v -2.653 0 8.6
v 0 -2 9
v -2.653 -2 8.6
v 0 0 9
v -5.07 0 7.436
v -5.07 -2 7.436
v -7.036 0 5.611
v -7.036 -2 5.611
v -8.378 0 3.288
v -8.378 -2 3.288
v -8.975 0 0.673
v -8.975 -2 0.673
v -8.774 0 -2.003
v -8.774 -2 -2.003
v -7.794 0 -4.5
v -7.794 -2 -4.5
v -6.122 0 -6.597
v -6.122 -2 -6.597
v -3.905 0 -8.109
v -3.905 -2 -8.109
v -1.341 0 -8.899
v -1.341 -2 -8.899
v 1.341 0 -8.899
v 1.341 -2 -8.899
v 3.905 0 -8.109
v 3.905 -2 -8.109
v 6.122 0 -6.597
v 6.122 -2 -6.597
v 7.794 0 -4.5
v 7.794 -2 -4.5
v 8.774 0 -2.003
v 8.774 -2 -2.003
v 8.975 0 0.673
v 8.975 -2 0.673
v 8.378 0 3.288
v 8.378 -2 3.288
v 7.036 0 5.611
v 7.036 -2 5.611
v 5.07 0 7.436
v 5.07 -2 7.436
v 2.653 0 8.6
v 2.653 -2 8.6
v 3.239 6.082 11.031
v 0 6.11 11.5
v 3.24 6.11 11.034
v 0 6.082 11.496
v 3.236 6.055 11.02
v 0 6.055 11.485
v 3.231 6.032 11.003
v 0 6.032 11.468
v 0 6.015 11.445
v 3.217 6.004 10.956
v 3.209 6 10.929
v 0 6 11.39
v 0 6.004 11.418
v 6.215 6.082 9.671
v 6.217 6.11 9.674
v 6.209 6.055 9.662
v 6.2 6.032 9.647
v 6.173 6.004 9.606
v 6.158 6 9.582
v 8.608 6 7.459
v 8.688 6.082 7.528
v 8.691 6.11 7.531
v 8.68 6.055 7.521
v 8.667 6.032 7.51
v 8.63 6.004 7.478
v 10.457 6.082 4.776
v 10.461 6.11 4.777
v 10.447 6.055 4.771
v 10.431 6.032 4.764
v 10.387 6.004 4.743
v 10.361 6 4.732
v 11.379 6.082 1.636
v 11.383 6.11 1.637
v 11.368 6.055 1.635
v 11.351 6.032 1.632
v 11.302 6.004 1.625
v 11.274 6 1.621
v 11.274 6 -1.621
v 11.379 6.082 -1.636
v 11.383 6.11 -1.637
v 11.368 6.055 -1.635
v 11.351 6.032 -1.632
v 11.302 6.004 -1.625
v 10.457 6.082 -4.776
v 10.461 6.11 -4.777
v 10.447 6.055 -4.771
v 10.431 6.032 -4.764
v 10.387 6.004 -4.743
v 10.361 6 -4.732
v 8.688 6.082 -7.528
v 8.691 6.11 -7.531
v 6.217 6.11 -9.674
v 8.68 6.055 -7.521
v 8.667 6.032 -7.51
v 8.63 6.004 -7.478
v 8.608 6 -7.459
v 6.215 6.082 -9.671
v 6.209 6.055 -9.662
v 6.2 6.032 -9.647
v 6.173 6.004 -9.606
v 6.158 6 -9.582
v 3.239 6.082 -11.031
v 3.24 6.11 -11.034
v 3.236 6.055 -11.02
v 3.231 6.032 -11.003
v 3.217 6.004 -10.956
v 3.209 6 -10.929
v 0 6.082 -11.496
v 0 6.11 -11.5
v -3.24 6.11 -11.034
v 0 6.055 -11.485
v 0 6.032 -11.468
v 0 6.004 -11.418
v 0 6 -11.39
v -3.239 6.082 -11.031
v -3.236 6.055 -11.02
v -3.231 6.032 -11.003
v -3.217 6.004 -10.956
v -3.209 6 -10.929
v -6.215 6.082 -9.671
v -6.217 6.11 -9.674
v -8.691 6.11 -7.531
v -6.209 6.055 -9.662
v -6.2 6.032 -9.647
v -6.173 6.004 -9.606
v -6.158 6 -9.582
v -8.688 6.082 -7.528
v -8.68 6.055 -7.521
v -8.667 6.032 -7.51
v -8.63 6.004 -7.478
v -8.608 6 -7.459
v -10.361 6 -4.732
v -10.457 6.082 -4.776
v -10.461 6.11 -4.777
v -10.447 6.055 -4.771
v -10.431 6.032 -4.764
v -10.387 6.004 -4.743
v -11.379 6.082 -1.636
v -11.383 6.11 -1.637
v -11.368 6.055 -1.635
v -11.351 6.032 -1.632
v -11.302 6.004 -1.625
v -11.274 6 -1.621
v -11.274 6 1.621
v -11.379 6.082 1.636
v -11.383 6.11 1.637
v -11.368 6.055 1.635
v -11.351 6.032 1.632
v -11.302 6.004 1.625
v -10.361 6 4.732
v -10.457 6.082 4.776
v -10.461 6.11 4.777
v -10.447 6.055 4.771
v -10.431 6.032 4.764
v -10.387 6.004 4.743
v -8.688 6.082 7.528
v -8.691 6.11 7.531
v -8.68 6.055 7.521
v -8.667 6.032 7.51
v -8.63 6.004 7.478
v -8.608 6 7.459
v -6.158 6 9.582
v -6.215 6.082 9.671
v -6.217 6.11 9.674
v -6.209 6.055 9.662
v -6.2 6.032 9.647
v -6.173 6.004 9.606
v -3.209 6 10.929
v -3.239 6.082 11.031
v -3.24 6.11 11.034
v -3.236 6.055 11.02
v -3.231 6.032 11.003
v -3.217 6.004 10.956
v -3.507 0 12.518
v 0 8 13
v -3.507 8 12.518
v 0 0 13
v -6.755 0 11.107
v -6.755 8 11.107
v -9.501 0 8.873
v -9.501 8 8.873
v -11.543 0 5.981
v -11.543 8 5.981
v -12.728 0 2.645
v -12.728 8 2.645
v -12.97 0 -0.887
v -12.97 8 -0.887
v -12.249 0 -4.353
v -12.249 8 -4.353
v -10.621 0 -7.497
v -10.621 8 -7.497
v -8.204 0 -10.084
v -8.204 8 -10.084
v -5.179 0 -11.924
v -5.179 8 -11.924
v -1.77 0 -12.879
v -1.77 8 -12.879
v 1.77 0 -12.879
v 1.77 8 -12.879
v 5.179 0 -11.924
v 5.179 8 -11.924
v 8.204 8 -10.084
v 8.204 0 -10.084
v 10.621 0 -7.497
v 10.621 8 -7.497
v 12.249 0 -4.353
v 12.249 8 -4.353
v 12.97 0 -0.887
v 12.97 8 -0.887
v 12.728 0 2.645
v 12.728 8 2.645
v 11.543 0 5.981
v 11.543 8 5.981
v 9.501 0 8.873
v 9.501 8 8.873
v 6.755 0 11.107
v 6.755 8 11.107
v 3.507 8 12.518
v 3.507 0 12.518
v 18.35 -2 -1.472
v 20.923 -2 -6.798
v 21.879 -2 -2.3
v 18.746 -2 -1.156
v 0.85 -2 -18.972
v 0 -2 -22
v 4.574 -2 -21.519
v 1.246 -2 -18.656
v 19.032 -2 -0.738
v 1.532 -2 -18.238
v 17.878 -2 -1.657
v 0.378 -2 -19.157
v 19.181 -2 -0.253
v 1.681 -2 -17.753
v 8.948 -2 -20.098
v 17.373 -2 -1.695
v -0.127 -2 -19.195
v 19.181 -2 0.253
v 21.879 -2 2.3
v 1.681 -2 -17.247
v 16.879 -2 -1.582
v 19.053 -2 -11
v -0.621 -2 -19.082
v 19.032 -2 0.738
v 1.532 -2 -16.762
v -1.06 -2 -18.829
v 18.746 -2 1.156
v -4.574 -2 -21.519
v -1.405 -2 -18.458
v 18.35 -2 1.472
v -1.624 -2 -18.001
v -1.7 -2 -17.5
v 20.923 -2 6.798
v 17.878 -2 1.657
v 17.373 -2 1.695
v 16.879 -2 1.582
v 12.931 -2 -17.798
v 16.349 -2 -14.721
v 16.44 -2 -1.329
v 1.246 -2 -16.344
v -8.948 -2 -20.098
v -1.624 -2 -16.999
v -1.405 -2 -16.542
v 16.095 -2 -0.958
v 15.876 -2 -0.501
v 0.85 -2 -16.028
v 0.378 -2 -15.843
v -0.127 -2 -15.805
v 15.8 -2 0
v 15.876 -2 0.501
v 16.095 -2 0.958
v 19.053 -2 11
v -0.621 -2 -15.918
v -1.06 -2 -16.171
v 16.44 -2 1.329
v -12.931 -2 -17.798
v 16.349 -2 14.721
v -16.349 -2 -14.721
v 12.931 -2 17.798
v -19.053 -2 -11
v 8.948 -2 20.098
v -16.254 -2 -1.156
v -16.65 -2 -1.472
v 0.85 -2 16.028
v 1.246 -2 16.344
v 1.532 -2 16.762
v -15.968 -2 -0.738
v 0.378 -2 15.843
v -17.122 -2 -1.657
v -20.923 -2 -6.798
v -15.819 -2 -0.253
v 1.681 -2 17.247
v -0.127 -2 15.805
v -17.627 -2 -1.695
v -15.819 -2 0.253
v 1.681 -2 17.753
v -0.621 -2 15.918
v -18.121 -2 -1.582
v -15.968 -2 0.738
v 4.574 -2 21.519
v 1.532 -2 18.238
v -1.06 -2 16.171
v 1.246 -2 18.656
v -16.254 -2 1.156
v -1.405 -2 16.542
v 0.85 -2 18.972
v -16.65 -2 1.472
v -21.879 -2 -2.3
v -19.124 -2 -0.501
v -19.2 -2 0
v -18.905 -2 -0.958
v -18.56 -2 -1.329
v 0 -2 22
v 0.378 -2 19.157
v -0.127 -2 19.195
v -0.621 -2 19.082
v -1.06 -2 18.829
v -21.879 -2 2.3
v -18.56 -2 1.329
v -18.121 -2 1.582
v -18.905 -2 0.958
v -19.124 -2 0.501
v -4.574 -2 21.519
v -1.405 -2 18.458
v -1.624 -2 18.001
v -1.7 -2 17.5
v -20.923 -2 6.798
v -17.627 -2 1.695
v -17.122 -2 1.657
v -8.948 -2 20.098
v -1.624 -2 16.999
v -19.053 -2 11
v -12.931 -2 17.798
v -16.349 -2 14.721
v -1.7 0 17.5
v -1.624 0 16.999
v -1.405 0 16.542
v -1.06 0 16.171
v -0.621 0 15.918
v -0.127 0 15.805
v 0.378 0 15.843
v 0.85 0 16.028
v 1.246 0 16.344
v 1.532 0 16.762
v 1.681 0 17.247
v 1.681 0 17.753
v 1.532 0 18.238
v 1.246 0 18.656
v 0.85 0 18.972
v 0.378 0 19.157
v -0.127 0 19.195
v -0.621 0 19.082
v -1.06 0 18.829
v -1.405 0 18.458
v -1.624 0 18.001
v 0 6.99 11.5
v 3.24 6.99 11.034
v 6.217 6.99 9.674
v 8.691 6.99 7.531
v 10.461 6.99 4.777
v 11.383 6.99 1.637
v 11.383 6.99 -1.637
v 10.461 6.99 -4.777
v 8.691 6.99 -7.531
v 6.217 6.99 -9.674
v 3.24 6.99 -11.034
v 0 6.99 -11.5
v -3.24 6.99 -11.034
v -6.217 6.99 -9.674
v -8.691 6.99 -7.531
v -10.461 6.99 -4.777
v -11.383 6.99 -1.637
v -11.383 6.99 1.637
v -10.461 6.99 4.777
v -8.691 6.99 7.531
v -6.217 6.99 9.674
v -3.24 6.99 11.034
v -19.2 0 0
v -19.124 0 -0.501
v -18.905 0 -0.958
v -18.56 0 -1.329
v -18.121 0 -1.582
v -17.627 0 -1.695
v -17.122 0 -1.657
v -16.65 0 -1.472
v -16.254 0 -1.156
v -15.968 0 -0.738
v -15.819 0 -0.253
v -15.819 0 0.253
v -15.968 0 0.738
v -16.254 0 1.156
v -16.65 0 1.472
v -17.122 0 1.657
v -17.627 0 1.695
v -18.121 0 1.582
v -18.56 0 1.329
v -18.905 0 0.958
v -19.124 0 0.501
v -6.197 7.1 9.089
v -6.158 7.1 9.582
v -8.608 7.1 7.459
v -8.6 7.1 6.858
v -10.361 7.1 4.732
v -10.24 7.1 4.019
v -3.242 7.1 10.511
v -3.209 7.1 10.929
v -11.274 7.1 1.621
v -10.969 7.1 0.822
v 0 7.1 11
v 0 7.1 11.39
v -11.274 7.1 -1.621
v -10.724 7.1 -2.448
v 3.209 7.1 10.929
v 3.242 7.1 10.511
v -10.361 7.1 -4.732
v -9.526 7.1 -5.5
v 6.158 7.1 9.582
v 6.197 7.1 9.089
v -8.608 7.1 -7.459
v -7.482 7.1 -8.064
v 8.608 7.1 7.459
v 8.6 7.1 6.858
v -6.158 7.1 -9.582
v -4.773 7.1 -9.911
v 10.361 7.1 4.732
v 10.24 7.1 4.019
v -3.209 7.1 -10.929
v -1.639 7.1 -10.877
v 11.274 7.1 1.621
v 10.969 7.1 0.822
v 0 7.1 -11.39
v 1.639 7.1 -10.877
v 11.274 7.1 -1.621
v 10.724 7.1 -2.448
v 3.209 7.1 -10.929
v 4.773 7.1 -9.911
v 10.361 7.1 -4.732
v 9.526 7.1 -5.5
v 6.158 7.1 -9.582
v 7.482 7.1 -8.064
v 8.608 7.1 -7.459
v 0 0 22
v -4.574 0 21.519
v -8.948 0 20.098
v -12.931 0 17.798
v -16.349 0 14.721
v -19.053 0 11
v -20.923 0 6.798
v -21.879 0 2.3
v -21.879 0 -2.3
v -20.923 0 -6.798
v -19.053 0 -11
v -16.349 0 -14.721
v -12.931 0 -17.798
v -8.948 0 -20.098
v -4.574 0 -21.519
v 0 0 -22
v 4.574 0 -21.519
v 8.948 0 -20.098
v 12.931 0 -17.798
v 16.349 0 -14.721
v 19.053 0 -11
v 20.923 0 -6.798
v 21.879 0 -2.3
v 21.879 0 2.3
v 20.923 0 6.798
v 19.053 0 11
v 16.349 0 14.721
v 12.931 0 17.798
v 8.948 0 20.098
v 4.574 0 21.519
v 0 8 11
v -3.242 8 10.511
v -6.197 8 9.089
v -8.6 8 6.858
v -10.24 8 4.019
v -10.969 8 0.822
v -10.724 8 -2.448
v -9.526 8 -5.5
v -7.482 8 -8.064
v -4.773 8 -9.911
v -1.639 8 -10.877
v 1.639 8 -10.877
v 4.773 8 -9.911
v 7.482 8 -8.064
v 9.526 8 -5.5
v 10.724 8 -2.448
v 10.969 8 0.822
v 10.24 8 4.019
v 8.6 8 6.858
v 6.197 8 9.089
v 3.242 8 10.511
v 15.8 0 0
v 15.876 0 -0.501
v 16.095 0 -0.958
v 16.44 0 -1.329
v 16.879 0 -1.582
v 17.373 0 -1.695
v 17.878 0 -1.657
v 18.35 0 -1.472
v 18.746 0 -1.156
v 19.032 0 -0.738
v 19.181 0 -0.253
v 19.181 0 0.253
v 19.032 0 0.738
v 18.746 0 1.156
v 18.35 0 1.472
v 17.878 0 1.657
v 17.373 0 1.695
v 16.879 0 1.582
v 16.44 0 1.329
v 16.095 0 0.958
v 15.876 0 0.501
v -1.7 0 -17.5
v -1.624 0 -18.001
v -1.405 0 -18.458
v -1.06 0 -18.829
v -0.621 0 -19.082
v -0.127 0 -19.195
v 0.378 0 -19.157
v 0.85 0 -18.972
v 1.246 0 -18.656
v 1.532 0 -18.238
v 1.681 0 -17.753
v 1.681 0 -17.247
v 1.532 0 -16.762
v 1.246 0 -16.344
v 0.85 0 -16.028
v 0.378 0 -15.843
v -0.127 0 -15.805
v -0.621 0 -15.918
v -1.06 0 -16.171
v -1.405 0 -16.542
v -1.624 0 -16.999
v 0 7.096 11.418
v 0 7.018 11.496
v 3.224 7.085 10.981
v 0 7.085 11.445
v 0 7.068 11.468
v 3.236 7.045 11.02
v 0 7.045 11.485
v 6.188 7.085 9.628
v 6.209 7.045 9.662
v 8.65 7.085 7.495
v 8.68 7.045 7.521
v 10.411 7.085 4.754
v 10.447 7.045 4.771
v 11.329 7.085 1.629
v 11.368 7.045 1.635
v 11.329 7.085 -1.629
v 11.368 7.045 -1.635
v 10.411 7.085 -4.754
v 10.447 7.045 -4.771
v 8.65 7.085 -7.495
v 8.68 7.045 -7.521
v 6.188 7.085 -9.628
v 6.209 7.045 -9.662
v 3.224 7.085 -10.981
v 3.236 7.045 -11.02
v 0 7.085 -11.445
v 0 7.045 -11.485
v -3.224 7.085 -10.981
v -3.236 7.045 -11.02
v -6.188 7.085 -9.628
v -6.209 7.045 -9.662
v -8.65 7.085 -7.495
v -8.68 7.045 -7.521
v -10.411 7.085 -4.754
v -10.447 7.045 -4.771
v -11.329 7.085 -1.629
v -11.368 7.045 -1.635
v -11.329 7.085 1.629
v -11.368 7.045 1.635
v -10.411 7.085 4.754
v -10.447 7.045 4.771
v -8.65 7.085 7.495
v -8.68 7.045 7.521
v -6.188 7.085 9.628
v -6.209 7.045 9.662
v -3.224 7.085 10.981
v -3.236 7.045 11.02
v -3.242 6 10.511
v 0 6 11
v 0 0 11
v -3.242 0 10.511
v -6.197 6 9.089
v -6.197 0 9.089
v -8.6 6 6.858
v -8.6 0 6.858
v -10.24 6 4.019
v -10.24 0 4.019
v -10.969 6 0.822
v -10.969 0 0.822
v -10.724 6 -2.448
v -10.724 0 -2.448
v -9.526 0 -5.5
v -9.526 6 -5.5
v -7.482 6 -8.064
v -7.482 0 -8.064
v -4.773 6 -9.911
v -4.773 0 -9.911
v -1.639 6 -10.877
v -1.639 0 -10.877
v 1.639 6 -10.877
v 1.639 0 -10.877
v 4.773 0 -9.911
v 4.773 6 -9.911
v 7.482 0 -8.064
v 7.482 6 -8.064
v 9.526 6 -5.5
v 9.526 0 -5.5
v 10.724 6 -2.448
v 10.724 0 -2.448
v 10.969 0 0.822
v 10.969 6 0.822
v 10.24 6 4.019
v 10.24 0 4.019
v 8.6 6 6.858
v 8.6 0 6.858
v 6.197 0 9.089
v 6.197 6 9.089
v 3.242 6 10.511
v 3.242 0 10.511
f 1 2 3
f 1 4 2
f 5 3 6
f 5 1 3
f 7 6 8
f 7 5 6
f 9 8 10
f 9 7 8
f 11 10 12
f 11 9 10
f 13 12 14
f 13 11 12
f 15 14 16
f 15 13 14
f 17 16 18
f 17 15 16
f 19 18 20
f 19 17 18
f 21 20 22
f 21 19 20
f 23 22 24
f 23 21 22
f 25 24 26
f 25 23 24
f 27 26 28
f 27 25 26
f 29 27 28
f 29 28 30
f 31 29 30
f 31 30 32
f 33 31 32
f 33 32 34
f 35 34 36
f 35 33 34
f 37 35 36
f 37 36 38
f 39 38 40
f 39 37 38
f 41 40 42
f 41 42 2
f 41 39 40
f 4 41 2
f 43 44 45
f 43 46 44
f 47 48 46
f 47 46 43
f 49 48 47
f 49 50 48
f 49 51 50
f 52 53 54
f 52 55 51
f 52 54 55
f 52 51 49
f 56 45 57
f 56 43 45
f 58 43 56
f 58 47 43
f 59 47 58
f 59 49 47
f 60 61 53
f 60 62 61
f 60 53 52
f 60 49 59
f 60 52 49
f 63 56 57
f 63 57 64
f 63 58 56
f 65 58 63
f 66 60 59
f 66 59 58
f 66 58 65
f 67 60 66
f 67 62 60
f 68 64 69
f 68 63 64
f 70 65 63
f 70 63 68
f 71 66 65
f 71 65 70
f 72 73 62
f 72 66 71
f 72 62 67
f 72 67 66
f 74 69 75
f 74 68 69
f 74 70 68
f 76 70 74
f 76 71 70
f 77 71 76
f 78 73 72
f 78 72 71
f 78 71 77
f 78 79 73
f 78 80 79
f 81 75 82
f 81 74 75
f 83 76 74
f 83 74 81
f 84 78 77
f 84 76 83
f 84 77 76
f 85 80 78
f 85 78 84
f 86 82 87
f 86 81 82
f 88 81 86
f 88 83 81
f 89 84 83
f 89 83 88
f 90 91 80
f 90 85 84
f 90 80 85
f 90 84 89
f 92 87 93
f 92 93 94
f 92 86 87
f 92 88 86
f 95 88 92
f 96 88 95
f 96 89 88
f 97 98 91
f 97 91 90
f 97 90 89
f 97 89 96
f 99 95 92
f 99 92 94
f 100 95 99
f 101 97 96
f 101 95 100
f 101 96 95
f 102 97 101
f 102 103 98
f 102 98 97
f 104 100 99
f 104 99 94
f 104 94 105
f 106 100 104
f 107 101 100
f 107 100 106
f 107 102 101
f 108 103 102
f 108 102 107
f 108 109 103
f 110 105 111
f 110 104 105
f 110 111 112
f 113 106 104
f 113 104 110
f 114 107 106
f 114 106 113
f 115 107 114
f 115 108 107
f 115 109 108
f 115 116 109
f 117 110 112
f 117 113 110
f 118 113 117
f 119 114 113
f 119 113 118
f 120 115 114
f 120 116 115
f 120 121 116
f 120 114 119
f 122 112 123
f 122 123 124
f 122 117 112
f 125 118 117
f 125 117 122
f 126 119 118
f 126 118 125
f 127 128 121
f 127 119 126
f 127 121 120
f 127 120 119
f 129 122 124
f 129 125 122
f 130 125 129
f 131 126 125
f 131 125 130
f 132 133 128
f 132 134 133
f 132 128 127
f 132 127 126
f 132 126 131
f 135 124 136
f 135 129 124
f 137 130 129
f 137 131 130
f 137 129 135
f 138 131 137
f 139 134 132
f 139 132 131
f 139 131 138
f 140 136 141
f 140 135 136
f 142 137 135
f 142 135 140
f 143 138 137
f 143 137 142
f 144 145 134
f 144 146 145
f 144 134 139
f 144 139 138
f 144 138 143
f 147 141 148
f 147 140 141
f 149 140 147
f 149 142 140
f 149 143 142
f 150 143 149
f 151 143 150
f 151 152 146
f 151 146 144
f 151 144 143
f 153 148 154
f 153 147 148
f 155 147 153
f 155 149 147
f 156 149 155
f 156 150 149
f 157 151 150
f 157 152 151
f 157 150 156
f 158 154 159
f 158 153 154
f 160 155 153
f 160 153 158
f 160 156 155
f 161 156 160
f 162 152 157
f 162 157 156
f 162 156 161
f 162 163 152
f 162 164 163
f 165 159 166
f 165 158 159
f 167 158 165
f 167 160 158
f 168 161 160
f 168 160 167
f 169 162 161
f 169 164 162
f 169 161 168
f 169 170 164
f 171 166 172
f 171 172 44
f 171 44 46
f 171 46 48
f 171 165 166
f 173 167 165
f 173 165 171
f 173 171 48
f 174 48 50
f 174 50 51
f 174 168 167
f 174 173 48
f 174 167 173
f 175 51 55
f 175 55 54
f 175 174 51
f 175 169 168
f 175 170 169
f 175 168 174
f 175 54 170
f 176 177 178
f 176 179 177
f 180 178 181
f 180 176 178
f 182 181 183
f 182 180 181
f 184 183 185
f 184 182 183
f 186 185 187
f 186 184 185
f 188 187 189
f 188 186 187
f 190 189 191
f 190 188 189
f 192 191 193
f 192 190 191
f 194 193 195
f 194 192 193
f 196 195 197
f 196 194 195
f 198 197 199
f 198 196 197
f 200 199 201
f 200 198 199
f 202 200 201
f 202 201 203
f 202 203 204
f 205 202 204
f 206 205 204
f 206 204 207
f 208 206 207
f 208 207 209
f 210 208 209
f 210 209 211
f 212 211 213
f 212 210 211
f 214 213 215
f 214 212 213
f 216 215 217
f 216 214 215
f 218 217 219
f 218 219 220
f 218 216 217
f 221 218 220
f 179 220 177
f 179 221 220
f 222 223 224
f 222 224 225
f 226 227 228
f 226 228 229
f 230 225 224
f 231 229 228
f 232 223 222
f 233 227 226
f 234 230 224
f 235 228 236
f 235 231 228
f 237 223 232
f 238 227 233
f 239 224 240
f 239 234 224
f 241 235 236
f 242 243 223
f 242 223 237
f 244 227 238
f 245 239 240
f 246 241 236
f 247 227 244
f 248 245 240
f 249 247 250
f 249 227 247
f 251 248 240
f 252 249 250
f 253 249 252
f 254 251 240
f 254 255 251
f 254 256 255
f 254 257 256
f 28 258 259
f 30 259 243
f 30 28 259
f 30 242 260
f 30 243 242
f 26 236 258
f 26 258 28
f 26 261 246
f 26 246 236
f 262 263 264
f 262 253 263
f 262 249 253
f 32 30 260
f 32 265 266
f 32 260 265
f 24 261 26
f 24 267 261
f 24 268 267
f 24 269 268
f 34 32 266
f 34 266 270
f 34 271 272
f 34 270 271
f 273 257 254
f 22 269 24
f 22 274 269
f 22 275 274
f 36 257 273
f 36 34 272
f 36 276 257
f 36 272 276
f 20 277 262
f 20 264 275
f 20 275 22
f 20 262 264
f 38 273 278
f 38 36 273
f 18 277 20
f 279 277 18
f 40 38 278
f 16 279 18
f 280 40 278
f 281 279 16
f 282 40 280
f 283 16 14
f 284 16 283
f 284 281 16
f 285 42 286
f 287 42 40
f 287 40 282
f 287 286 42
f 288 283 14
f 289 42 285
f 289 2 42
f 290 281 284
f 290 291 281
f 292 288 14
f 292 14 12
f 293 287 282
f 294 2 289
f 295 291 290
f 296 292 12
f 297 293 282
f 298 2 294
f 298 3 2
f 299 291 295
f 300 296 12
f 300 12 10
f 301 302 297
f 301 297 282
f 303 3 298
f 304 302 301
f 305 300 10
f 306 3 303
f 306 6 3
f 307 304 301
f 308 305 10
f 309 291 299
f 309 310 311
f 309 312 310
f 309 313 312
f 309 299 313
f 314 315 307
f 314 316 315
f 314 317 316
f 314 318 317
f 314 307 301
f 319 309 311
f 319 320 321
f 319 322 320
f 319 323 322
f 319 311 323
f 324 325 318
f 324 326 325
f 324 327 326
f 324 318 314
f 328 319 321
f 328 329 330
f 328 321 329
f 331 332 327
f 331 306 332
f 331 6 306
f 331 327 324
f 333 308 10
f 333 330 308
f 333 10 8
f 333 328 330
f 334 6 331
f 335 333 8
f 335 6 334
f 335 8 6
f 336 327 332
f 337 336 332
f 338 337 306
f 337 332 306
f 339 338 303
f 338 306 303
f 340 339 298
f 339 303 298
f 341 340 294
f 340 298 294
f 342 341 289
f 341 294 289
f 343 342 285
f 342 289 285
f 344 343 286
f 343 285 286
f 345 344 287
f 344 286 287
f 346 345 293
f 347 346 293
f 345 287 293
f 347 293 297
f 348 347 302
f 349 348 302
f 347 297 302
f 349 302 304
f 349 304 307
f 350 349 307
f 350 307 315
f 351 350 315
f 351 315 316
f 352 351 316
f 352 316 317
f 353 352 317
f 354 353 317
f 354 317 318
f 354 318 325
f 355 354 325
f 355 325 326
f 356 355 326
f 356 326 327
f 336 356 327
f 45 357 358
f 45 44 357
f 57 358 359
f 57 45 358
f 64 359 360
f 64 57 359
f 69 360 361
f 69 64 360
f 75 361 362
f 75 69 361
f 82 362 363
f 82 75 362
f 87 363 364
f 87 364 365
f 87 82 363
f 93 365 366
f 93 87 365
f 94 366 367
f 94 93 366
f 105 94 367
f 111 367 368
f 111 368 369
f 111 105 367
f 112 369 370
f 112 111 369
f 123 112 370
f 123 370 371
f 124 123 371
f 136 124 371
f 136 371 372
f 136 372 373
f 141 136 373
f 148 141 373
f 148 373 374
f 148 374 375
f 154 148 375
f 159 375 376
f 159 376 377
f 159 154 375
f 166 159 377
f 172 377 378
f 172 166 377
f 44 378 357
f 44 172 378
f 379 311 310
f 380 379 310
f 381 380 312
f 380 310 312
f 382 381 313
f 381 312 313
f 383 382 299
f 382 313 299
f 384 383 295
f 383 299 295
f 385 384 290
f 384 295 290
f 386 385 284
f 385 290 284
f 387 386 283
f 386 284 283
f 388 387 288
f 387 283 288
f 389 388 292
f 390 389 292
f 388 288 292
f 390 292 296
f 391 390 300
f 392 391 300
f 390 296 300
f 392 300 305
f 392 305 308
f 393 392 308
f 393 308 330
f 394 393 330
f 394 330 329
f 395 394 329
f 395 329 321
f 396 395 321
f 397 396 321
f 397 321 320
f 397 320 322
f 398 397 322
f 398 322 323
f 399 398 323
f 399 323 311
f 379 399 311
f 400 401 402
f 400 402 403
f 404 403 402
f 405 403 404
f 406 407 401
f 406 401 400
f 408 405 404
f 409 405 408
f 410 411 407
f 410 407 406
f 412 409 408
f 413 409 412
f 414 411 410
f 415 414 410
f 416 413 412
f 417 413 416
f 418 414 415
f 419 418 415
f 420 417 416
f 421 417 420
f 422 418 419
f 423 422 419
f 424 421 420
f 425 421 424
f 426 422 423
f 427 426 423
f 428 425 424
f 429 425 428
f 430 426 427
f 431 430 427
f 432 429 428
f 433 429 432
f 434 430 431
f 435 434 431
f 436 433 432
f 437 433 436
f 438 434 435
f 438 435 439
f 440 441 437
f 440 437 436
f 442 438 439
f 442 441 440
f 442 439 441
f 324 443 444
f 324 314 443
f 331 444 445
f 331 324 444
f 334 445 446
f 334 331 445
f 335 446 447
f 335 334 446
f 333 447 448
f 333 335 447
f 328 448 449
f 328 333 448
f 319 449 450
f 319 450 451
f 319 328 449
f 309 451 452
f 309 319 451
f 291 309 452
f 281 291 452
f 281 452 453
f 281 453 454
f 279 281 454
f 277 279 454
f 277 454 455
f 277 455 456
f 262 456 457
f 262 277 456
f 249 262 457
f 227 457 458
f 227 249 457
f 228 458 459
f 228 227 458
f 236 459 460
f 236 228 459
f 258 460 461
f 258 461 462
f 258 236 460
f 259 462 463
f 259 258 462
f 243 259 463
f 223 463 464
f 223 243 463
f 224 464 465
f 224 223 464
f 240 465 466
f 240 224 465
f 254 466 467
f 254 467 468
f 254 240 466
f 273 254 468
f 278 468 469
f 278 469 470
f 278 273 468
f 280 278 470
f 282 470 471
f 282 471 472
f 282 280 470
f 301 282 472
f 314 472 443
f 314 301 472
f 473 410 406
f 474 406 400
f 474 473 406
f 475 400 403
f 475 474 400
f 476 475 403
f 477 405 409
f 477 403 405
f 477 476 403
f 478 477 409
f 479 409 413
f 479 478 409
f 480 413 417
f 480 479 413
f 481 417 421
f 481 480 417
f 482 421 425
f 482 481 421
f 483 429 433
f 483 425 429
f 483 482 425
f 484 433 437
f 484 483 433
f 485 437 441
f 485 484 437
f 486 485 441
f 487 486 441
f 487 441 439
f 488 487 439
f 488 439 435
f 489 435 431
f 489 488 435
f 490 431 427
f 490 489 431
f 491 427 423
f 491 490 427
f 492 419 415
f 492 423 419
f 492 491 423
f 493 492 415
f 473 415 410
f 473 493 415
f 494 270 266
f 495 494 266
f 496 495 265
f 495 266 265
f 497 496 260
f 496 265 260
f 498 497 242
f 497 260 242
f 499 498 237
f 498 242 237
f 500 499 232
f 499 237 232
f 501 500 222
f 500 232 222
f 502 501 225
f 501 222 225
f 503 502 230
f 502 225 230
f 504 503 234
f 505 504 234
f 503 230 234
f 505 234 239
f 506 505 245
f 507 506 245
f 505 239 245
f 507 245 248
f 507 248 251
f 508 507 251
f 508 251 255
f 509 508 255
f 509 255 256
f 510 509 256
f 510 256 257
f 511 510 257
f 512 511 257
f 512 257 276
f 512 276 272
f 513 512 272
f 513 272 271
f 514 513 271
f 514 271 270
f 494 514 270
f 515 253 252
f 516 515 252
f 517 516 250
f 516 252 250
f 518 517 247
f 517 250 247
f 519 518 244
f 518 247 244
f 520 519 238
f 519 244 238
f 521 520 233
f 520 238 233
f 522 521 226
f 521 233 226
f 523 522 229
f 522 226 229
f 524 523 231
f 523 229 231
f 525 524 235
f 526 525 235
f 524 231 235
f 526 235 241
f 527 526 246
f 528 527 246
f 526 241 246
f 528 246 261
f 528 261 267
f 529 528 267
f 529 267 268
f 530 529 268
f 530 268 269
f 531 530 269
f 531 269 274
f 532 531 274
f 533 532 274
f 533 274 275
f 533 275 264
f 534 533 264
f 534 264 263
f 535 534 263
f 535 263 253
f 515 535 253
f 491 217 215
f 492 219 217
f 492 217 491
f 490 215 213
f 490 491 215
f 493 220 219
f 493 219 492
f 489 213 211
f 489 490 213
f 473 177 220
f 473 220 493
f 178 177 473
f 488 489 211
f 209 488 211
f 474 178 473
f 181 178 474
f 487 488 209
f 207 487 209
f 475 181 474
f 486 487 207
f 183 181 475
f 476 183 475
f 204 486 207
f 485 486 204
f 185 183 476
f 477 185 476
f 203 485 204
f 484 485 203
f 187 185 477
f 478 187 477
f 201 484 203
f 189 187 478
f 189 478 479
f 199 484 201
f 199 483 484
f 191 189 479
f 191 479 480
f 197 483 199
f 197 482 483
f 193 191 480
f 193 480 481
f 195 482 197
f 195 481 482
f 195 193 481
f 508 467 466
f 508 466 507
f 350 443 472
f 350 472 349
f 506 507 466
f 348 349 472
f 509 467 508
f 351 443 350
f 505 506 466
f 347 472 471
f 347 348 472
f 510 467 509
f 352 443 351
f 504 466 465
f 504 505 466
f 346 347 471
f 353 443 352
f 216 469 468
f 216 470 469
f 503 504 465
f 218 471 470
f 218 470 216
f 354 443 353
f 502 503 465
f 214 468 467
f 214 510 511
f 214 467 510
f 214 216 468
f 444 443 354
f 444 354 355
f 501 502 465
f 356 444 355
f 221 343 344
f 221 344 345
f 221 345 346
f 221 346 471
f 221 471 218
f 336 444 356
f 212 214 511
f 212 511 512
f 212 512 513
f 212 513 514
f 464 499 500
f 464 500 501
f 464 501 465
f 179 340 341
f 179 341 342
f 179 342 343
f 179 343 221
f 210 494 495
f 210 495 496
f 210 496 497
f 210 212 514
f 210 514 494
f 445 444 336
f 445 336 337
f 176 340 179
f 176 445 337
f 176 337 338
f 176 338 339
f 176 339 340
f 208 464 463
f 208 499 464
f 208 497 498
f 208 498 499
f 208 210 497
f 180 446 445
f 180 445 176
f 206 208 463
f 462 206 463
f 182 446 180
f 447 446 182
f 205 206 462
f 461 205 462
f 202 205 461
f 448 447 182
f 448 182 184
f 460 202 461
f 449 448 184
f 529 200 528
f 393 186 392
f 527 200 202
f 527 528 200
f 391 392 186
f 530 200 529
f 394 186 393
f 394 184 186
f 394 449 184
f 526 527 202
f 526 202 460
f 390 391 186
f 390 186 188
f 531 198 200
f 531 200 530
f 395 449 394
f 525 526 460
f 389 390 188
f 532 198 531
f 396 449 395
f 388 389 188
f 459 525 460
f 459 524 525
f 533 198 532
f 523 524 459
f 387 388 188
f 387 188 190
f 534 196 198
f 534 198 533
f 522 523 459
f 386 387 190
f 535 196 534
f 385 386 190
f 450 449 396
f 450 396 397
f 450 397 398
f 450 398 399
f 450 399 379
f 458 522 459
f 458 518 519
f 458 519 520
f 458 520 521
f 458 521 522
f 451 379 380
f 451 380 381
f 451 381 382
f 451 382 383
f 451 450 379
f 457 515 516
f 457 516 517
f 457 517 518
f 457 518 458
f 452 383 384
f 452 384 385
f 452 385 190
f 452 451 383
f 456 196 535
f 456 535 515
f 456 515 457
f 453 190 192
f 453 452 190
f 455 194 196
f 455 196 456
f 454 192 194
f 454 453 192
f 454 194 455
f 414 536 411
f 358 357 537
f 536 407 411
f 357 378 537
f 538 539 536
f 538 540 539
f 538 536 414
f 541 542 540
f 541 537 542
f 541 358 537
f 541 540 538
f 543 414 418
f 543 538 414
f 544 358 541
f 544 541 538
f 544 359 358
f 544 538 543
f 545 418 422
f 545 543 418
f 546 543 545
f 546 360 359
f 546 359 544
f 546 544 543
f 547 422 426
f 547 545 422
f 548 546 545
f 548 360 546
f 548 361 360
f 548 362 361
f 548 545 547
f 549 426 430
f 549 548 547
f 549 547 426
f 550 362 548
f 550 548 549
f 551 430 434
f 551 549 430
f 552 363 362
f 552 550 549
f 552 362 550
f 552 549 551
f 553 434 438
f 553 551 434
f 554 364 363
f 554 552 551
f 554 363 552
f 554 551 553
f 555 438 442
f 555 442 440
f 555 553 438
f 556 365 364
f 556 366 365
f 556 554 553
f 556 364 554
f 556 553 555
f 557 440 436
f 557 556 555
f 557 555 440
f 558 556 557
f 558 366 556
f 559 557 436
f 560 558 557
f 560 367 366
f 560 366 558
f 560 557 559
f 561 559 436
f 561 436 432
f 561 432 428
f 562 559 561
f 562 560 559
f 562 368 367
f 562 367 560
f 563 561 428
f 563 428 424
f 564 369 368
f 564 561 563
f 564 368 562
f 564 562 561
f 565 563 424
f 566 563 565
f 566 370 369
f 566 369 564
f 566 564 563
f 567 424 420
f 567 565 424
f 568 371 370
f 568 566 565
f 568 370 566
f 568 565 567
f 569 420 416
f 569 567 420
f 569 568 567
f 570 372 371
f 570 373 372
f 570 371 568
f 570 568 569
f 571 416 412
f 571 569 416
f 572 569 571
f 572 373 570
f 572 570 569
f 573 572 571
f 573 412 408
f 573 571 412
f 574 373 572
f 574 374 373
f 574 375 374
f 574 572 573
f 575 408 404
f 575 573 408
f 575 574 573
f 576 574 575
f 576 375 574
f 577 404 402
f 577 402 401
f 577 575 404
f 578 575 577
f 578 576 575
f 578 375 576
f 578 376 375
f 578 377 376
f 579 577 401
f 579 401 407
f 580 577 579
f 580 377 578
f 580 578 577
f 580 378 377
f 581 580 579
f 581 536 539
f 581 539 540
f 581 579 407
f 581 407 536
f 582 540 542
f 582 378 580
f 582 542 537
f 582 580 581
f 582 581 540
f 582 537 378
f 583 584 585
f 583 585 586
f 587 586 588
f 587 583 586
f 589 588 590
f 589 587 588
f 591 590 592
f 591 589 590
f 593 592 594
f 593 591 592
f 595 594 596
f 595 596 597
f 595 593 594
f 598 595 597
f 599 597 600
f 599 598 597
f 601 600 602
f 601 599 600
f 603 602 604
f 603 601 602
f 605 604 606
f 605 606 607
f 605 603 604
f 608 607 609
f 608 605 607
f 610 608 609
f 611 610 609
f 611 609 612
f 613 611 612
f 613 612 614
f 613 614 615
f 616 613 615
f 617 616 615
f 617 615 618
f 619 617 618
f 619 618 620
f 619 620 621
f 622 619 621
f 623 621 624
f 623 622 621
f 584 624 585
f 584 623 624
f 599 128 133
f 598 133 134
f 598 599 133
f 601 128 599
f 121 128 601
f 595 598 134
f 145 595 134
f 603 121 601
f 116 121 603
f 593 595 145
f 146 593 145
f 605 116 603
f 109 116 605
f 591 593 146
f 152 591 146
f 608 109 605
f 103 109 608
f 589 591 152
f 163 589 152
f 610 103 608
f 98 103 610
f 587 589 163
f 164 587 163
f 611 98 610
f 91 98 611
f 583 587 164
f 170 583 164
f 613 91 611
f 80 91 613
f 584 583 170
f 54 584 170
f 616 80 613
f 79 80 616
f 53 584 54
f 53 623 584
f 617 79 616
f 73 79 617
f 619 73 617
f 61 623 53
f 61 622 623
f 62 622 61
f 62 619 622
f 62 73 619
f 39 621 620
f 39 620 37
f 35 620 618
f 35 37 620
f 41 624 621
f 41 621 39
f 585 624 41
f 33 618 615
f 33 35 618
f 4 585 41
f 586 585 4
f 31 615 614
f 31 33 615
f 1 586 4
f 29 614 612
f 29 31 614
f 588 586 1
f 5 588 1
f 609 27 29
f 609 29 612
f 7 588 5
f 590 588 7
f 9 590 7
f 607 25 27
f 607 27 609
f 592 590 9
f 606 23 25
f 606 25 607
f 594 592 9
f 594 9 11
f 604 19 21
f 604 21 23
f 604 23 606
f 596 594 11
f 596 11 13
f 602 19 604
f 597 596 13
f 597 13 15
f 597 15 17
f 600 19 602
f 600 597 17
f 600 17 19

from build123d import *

# Parameters (mm, degrees)
M3_CLEARANCE_HOLE1_D = 3.4


with BuildPart() as part:
    # Sketch1 → Revolve1 (revolve)
    with BuildSketch(Plane.XY, mode=Mode.PRIVATE) as revolve1_sk:
        Polygon((9, 0), (11, 0), (11, 8), (13, 8), (13, 0), (22, 0), (22, -2), (9, -2), align=None)
    revolve(revolve1_sk.sketch.rotate(Axis((0, 17.954019247, 0), (0, -1, 0)), 90), axis=Axis((0, 17.954019247, 0), (0, -1, 0)))

    # Sketch4 → Groove for BS 3673 P4 - B022M, Internal Circlip1 (revolve, cut)
    with BuildSketch(Plane(origin=(0, 17.954019247, 0), x_dir=(0, 0, 1), z_dir=(-1, 0, 0))):
        with BuildLine():
            Line((11.39, -11.954019247), (9.9, -11.954019247))
            Line((9.9, -11.954019247), (9.9, -10.854019247))
            Line((9.9, -10.854019247), (11.39, -10.854019247))
            ThreePointArc((11.39, -10.854019247), (11.467781746, -10.886237501), (11.5, -10.964019247))
            Line((11.5, -10.964019247), (11.5, -11.844019247))
            ThreePointArc((11.5, -11.844019247), (11.467781746, -11.921800993), (11.39, -11.954019247))
        make_face()
    revolve(axis=Axis((0, -32.045980753, 0), (0, 1, 0)), mode=Mode.SUBTRACT)

    # M3 Clearance Hole1 (through all)
    with Locations(Plane(origin=(0, 0, 0), x_dir=(1, 0, 0), z_dir=(0, 1, 0))):
        with Locations((0, 17.5), (17.5, 0), (0, -17.5), (-17.5, 0)):
            Hole(M3_CLEARANCE_HOLE1_D / 2)


solid = part.part
